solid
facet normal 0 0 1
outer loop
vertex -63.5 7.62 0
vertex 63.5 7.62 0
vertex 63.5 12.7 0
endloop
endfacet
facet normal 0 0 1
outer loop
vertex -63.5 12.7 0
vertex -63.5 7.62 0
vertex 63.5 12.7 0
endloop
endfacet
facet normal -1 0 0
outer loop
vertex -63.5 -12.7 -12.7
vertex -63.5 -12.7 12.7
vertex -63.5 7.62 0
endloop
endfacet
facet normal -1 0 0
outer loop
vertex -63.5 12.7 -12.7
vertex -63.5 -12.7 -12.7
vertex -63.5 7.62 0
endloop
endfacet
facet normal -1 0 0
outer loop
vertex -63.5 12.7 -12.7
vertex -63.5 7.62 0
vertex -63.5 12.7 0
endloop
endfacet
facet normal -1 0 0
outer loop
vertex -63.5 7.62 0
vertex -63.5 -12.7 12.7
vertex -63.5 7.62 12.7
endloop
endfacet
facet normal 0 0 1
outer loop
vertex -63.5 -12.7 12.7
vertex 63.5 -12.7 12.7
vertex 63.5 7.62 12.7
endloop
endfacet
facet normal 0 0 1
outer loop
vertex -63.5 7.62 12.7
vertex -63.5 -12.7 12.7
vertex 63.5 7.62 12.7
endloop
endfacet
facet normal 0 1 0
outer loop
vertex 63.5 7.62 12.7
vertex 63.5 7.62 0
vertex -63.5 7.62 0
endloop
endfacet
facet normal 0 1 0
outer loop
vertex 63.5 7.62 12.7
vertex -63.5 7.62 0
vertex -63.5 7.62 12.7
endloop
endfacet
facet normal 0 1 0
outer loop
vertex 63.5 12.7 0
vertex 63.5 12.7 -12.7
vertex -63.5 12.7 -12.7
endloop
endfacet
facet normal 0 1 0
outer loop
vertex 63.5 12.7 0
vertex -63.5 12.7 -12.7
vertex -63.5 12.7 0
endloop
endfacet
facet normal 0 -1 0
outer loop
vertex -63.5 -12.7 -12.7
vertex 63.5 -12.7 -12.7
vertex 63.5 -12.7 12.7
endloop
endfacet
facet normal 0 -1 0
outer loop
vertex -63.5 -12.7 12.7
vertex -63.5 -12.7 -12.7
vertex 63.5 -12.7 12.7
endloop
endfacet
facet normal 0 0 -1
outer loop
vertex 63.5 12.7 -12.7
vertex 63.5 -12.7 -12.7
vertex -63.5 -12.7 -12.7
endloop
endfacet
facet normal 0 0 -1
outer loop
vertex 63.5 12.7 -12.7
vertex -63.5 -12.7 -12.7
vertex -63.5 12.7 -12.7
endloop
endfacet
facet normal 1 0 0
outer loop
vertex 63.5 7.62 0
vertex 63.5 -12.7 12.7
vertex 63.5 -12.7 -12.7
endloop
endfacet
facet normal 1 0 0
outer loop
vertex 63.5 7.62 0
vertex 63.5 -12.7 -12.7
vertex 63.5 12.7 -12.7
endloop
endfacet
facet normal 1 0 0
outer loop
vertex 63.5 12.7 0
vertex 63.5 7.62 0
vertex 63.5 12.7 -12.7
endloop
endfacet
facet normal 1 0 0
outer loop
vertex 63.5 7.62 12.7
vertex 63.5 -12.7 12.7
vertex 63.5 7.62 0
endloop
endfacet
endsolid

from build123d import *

# Parameters (mm, degrees)
F0_W     = 25.4
F0_H     = 25.4
F1_DEPTH = 63.5
F2_W     = 5.08
F2_H     = 12.7
F3_DEPTH = 127.001


with BuildPart() as f1:
    # F0 (on Right) → F1 (new body, symmetric)
    with BuildSketch(Plane.YZ):
        Rectangle(F0_W, F0_H)
    extrude(amount=F1_DEPTH, both=True)

    # F2 (on face) → F3 (cut, through all)
    with BuildSketch(Plane.YZ.offset(63.5)):
        with Locations((10.16, 6.35)):
            Rectangle(F2_W, F2_H)
    extrude(amount=-F3_DEPTH, mode=Mode.SUBTRACT)


solid = f1.part
